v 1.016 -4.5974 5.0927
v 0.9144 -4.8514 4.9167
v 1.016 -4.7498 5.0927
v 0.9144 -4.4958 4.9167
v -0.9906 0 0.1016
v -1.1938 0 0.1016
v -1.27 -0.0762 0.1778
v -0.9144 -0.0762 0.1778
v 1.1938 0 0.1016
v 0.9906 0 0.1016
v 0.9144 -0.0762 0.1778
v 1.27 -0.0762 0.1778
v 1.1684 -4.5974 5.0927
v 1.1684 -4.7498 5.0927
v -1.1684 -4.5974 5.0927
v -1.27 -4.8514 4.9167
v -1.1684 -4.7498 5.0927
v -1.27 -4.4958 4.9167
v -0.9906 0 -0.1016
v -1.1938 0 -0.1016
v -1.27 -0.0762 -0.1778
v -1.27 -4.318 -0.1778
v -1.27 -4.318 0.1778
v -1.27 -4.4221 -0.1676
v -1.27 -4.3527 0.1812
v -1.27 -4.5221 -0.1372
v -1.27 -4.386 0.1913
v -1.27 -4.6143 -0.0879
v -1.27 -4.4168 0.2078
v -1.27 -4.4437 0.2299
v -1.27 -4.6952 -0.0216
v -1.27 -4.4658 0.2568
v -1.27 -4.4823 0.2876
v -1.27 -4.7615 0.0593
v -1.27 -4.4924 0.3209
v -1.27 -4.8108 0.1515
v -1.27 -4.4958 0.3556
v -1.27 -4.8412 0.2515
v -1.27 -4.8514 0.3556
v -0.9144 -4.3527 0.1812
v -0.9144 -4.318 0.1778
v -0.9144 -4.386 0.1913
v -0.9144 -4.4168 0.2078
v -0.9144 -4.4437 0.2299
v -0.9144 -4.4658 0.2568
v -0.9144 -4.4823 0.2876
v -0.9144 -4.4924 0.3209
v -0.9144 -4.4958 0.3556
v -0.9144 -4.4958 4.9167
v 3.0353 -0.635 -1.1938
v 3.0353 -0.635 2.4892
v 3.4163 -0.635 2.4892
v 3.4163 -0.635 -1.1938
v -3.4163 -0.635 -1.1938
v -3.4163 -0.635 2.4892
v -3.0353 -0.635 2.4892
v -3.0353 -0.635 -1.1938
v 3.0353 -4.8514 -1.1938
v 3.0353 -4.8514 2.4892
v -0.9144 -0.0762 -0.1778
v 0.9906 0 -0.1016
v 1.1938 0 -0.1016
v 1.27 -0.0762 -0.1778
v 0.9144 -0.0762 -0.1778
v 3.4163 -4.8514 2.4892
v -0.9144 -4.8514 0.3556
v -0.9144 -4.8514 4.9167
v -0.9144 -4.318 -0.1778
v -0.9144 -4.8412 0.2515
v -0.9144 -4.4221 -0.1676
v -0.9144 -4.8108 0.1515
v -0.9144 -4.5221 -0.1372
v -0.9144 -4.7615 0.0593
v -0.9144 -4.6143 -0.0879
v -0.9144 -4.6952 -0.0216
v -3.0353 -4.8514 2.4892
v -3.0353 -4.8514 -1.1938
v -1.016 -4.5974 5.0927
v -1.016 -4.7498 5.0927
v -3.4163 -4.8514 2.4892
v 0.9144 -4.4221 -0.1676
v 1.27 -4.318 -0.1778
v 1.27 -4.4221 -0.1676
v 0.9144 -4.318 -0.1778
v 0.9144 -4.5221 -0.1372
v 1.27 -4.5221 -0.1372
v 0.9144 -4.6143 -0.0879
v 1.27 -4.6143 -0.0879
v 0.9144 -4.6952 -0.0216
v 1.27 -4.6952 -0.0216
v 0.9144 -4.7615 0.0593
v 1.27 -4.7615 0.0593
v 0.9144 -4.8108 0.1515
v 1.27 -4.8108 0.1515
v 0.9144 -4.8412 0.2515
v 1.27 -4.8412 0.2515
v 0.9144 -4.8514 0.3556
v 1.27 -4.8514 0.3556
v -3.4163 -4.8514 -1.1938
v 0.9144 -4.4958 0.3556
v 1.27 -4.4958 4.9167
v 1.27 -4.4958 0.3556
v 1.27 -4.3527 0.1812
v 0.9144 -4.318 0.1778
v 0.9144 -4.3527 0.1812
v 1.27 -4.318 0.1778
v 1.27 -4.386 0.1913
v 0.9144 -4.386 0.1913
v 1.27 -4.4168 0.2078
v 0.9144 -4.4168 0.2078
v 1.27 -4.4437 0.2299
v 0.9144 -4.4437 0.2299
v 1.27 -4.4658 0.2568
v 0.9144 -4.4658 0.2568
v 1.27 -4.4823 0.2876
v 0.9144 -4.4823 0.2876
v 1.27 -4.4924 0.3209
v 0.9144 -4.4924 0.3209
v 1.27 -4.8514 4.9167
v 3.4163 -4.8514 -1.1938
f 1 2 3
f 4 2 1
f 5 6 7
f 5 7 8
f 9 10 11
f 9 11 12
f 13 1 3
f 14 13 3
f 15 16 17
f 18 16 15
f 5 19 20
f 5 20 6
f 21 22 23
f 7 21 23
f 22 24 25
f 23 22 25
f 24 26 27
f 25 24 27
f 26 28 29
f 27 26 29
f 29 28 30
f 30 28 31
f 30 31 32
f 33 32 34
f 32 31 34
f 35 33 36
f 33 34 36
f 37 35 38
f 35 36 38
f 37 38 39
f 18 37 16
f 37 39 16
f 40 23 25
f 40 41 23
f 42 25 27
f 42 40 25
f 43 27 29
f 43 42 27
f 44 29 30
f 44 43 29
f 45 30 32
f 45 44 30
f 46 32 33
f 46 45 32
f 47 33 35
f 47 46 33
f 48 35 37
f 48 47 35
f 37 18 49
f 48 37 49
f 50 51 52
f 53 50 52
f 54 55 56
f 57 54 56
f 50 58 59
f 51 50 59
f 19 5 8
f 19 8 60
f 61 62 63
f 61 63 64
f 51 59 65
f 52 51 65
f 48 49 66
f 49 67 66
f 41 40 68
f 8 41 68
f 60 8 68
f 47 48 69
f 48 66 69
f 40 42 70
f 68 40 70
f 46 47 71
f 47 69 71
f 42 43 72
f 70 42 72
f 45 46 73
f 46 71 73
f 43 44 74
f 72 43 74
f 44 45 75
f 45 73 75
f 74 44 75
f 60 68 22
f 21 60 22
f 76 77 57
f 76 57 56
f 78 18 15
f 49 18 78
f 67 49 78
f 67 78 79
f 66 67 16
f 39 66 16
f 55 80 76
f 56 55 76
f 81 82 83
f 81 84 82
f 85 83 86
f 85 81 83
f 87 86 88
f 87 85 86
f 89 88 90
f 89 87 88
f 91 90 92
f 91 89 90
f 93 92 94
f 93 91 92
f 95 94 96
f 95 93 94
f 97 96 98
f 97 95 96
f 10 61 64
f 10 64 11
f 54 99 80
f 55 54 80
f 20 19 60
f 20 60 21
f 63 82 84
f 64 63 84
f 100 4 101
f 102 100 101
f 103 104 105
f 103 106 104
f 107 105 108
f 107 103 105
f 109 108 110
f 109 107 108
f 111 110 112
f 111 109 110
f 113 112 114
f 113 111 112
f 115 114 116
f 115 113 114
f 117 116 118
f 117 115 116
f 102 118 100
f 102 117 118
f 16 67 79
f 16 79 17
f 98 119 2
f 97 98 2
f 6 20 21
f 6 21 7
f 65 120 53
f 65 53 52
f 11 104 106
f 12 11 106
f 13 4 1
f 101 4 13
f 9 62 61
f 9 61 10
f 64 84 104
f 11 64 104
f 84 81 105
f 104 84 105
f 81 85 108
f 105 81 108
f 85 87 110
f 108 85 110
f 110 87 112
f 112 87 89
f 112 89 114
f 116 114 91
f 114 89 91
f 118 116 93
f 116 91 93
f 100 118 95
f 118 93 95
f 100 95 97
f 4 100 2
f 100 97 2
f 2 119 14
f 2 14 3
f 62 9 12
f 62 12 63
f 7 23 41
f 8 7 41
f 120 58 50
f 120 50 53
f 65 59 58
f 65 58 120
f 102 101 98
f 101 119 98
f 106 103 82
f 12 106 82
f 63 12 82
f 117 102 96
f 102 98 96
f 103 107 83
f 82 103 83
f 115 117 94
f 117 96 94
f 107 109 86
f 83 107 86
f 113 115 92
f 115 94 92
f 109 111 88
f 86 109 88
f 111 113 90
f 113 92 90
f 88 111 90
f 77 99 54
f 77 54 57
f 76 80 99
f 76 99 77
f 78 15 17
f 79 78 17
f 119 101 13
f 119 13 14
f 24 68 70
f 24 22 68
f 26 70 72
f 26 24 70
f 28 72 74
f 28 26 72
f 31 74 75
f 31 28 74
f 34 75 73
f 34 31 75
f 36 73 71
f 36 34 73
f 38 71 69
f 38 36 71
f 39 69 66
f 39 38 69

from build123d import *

# Parameters (mm, degrees)
SKETCH1_W             = 0.3556
SKETCH1_H             = 0.3556
SKETCH4_W             = 0.381
SKETCH4_H             = 3.683
BOSS_EXTRUDE1_DEPTH   = 4.2164
BOSS_EXTRUDE1_2_DEPTH = 4.2164
CHAMFER1_SIZE         = 0.0762
CHAMFER2_SIZE         = 0.0762
CHAMFER3_SIZE         = 0.1016
CHAMFER3_SIZE2        = 0.175976362
CHAMFER4_SIZE         = 0.1016
CHAMFER4_SIZE2        = 0.175976362


with BuildPart() as part:
    # Sweep1: sweep along a path in Sketch2
    with BuildLine(Plane(origin=(0, 0, 0), x_dir=(0, 0, -1), z_dir=(1, 0, 0))) as sweep1_path:
        Line((-0.1778, 0), (-0.1778, -4.318))
        ThreePointArc((-0.1778, -4.318), (-0.229876414, -4.443723586), (-0.3556, -4.4958))
        Line((-0.3556, -4.4958), (-5.0927, -4.4958))
    # Sketch1 → Sweep1 (sweep)
    with BuildSketch(Plane(origin=(0, 0, 0), x_dir=(1, 0, 0), z_dir=(0, 1, 0))):
        with Locations((-1.0922, 0)):
            Rectangle(SKETCH1_W, SKETCH1_H)
        with Locations((1.0922, 0)):
            Rectangle(SKETCH1_W, SKETCH1_H)
    sweep(path=sweep1_path.line)

    # Chamfer1
    chamfer1_edges = [part.edges().sort_by_distance(p)[0] for p in [
        (1.0922, 0, 0.1778),
        (1.27, 0, 0),
        (1.0922, 0, -0.1778),
        (0.9144, 0, 0),
    ]]
    chamfer(chamfer1_edges, length=CHAMFER1_SIZE)

    # Chamfer2
    chamfer2_edges = [part.edges().sort_by_distance(p)[0] for p in [
        (-1.0922, 0, 0.1778),
        (-0.9144, 0, 0),
        (-1.0922, 0, -0.1778),
        (-1.27, 0, 0),
    ]]
    chamfer(chamfer2_edges, length=CHAMFER2_SIZE)

    # Chamfer3
    chamfer3_edges = [part.edges().sort_by_distance(p)[0] for p in [
        (-1.27, -4.6736, 5.0927),
        (-1.0922, -4.4958, 5.0927),
        (-0.9144, -4.6736, 5.0927),
        (-1.0922, -4.8514, 5.0927),
    ]]
    chamfer3_side = [part.faces().sort_by_distance(p)[0] for p in [
        (-1.0922, -4.6736, 5.0927),
    ]]
    chamfer(chamfer3_edges, length=CHAMFER3_SIZE, length2=CHAMFER3_SIZE2, reference=chamfer3_side[0])

    # Chamfer4
    chamfer4_edges = [part.edges().sort_by_distance(p)[0] for p in [
        (0.9144, -4.6736, 5.0927),
        (1.0922, -4.4958, 5.0927),
        (1.27, -4.6736, 5.0927),
        (1.0922, -4.8514, 5.0927),
    ]]
    chamfer4_side = [part.faces().sort_by_distance(p)[0] for p in [
        (1.0922, -4.6736, 5.0927),
    ]]
    chamfer(chamfer4_edges, length=CHAMFER4_SIZE, length2=CHAMFER4_SIZE2, reference=chamfer4_side[0])


with BuildPart() as body_2:
    # Sketch4 → Boss-Extrude1 (new body)
    with BuildSketch(Plane.XZ.offset(4.8514)):
        with Locations((3.2258, 0.6477)):
            Rectangle(SKETCH4_W, SKETCH4_H)
    extrude(amount=-BOSS_EXTRUDE1_DEPTH)


with BuildPart() as body_3:
    # Sketch4 → Boss-Extrude1 2 (new body)
    with BuildSketch(Plane.XZ.offset(4.8514)):
        with Locations((-3.2258, 0.6477)):
            Rectangle(SKETCH4_W, SKETCH4_H)
    extrude(amount=-BOSS_EXTRUDE1_2_DEPTH)


solid = Compound([part.part, body_2.part, body_3.part])
